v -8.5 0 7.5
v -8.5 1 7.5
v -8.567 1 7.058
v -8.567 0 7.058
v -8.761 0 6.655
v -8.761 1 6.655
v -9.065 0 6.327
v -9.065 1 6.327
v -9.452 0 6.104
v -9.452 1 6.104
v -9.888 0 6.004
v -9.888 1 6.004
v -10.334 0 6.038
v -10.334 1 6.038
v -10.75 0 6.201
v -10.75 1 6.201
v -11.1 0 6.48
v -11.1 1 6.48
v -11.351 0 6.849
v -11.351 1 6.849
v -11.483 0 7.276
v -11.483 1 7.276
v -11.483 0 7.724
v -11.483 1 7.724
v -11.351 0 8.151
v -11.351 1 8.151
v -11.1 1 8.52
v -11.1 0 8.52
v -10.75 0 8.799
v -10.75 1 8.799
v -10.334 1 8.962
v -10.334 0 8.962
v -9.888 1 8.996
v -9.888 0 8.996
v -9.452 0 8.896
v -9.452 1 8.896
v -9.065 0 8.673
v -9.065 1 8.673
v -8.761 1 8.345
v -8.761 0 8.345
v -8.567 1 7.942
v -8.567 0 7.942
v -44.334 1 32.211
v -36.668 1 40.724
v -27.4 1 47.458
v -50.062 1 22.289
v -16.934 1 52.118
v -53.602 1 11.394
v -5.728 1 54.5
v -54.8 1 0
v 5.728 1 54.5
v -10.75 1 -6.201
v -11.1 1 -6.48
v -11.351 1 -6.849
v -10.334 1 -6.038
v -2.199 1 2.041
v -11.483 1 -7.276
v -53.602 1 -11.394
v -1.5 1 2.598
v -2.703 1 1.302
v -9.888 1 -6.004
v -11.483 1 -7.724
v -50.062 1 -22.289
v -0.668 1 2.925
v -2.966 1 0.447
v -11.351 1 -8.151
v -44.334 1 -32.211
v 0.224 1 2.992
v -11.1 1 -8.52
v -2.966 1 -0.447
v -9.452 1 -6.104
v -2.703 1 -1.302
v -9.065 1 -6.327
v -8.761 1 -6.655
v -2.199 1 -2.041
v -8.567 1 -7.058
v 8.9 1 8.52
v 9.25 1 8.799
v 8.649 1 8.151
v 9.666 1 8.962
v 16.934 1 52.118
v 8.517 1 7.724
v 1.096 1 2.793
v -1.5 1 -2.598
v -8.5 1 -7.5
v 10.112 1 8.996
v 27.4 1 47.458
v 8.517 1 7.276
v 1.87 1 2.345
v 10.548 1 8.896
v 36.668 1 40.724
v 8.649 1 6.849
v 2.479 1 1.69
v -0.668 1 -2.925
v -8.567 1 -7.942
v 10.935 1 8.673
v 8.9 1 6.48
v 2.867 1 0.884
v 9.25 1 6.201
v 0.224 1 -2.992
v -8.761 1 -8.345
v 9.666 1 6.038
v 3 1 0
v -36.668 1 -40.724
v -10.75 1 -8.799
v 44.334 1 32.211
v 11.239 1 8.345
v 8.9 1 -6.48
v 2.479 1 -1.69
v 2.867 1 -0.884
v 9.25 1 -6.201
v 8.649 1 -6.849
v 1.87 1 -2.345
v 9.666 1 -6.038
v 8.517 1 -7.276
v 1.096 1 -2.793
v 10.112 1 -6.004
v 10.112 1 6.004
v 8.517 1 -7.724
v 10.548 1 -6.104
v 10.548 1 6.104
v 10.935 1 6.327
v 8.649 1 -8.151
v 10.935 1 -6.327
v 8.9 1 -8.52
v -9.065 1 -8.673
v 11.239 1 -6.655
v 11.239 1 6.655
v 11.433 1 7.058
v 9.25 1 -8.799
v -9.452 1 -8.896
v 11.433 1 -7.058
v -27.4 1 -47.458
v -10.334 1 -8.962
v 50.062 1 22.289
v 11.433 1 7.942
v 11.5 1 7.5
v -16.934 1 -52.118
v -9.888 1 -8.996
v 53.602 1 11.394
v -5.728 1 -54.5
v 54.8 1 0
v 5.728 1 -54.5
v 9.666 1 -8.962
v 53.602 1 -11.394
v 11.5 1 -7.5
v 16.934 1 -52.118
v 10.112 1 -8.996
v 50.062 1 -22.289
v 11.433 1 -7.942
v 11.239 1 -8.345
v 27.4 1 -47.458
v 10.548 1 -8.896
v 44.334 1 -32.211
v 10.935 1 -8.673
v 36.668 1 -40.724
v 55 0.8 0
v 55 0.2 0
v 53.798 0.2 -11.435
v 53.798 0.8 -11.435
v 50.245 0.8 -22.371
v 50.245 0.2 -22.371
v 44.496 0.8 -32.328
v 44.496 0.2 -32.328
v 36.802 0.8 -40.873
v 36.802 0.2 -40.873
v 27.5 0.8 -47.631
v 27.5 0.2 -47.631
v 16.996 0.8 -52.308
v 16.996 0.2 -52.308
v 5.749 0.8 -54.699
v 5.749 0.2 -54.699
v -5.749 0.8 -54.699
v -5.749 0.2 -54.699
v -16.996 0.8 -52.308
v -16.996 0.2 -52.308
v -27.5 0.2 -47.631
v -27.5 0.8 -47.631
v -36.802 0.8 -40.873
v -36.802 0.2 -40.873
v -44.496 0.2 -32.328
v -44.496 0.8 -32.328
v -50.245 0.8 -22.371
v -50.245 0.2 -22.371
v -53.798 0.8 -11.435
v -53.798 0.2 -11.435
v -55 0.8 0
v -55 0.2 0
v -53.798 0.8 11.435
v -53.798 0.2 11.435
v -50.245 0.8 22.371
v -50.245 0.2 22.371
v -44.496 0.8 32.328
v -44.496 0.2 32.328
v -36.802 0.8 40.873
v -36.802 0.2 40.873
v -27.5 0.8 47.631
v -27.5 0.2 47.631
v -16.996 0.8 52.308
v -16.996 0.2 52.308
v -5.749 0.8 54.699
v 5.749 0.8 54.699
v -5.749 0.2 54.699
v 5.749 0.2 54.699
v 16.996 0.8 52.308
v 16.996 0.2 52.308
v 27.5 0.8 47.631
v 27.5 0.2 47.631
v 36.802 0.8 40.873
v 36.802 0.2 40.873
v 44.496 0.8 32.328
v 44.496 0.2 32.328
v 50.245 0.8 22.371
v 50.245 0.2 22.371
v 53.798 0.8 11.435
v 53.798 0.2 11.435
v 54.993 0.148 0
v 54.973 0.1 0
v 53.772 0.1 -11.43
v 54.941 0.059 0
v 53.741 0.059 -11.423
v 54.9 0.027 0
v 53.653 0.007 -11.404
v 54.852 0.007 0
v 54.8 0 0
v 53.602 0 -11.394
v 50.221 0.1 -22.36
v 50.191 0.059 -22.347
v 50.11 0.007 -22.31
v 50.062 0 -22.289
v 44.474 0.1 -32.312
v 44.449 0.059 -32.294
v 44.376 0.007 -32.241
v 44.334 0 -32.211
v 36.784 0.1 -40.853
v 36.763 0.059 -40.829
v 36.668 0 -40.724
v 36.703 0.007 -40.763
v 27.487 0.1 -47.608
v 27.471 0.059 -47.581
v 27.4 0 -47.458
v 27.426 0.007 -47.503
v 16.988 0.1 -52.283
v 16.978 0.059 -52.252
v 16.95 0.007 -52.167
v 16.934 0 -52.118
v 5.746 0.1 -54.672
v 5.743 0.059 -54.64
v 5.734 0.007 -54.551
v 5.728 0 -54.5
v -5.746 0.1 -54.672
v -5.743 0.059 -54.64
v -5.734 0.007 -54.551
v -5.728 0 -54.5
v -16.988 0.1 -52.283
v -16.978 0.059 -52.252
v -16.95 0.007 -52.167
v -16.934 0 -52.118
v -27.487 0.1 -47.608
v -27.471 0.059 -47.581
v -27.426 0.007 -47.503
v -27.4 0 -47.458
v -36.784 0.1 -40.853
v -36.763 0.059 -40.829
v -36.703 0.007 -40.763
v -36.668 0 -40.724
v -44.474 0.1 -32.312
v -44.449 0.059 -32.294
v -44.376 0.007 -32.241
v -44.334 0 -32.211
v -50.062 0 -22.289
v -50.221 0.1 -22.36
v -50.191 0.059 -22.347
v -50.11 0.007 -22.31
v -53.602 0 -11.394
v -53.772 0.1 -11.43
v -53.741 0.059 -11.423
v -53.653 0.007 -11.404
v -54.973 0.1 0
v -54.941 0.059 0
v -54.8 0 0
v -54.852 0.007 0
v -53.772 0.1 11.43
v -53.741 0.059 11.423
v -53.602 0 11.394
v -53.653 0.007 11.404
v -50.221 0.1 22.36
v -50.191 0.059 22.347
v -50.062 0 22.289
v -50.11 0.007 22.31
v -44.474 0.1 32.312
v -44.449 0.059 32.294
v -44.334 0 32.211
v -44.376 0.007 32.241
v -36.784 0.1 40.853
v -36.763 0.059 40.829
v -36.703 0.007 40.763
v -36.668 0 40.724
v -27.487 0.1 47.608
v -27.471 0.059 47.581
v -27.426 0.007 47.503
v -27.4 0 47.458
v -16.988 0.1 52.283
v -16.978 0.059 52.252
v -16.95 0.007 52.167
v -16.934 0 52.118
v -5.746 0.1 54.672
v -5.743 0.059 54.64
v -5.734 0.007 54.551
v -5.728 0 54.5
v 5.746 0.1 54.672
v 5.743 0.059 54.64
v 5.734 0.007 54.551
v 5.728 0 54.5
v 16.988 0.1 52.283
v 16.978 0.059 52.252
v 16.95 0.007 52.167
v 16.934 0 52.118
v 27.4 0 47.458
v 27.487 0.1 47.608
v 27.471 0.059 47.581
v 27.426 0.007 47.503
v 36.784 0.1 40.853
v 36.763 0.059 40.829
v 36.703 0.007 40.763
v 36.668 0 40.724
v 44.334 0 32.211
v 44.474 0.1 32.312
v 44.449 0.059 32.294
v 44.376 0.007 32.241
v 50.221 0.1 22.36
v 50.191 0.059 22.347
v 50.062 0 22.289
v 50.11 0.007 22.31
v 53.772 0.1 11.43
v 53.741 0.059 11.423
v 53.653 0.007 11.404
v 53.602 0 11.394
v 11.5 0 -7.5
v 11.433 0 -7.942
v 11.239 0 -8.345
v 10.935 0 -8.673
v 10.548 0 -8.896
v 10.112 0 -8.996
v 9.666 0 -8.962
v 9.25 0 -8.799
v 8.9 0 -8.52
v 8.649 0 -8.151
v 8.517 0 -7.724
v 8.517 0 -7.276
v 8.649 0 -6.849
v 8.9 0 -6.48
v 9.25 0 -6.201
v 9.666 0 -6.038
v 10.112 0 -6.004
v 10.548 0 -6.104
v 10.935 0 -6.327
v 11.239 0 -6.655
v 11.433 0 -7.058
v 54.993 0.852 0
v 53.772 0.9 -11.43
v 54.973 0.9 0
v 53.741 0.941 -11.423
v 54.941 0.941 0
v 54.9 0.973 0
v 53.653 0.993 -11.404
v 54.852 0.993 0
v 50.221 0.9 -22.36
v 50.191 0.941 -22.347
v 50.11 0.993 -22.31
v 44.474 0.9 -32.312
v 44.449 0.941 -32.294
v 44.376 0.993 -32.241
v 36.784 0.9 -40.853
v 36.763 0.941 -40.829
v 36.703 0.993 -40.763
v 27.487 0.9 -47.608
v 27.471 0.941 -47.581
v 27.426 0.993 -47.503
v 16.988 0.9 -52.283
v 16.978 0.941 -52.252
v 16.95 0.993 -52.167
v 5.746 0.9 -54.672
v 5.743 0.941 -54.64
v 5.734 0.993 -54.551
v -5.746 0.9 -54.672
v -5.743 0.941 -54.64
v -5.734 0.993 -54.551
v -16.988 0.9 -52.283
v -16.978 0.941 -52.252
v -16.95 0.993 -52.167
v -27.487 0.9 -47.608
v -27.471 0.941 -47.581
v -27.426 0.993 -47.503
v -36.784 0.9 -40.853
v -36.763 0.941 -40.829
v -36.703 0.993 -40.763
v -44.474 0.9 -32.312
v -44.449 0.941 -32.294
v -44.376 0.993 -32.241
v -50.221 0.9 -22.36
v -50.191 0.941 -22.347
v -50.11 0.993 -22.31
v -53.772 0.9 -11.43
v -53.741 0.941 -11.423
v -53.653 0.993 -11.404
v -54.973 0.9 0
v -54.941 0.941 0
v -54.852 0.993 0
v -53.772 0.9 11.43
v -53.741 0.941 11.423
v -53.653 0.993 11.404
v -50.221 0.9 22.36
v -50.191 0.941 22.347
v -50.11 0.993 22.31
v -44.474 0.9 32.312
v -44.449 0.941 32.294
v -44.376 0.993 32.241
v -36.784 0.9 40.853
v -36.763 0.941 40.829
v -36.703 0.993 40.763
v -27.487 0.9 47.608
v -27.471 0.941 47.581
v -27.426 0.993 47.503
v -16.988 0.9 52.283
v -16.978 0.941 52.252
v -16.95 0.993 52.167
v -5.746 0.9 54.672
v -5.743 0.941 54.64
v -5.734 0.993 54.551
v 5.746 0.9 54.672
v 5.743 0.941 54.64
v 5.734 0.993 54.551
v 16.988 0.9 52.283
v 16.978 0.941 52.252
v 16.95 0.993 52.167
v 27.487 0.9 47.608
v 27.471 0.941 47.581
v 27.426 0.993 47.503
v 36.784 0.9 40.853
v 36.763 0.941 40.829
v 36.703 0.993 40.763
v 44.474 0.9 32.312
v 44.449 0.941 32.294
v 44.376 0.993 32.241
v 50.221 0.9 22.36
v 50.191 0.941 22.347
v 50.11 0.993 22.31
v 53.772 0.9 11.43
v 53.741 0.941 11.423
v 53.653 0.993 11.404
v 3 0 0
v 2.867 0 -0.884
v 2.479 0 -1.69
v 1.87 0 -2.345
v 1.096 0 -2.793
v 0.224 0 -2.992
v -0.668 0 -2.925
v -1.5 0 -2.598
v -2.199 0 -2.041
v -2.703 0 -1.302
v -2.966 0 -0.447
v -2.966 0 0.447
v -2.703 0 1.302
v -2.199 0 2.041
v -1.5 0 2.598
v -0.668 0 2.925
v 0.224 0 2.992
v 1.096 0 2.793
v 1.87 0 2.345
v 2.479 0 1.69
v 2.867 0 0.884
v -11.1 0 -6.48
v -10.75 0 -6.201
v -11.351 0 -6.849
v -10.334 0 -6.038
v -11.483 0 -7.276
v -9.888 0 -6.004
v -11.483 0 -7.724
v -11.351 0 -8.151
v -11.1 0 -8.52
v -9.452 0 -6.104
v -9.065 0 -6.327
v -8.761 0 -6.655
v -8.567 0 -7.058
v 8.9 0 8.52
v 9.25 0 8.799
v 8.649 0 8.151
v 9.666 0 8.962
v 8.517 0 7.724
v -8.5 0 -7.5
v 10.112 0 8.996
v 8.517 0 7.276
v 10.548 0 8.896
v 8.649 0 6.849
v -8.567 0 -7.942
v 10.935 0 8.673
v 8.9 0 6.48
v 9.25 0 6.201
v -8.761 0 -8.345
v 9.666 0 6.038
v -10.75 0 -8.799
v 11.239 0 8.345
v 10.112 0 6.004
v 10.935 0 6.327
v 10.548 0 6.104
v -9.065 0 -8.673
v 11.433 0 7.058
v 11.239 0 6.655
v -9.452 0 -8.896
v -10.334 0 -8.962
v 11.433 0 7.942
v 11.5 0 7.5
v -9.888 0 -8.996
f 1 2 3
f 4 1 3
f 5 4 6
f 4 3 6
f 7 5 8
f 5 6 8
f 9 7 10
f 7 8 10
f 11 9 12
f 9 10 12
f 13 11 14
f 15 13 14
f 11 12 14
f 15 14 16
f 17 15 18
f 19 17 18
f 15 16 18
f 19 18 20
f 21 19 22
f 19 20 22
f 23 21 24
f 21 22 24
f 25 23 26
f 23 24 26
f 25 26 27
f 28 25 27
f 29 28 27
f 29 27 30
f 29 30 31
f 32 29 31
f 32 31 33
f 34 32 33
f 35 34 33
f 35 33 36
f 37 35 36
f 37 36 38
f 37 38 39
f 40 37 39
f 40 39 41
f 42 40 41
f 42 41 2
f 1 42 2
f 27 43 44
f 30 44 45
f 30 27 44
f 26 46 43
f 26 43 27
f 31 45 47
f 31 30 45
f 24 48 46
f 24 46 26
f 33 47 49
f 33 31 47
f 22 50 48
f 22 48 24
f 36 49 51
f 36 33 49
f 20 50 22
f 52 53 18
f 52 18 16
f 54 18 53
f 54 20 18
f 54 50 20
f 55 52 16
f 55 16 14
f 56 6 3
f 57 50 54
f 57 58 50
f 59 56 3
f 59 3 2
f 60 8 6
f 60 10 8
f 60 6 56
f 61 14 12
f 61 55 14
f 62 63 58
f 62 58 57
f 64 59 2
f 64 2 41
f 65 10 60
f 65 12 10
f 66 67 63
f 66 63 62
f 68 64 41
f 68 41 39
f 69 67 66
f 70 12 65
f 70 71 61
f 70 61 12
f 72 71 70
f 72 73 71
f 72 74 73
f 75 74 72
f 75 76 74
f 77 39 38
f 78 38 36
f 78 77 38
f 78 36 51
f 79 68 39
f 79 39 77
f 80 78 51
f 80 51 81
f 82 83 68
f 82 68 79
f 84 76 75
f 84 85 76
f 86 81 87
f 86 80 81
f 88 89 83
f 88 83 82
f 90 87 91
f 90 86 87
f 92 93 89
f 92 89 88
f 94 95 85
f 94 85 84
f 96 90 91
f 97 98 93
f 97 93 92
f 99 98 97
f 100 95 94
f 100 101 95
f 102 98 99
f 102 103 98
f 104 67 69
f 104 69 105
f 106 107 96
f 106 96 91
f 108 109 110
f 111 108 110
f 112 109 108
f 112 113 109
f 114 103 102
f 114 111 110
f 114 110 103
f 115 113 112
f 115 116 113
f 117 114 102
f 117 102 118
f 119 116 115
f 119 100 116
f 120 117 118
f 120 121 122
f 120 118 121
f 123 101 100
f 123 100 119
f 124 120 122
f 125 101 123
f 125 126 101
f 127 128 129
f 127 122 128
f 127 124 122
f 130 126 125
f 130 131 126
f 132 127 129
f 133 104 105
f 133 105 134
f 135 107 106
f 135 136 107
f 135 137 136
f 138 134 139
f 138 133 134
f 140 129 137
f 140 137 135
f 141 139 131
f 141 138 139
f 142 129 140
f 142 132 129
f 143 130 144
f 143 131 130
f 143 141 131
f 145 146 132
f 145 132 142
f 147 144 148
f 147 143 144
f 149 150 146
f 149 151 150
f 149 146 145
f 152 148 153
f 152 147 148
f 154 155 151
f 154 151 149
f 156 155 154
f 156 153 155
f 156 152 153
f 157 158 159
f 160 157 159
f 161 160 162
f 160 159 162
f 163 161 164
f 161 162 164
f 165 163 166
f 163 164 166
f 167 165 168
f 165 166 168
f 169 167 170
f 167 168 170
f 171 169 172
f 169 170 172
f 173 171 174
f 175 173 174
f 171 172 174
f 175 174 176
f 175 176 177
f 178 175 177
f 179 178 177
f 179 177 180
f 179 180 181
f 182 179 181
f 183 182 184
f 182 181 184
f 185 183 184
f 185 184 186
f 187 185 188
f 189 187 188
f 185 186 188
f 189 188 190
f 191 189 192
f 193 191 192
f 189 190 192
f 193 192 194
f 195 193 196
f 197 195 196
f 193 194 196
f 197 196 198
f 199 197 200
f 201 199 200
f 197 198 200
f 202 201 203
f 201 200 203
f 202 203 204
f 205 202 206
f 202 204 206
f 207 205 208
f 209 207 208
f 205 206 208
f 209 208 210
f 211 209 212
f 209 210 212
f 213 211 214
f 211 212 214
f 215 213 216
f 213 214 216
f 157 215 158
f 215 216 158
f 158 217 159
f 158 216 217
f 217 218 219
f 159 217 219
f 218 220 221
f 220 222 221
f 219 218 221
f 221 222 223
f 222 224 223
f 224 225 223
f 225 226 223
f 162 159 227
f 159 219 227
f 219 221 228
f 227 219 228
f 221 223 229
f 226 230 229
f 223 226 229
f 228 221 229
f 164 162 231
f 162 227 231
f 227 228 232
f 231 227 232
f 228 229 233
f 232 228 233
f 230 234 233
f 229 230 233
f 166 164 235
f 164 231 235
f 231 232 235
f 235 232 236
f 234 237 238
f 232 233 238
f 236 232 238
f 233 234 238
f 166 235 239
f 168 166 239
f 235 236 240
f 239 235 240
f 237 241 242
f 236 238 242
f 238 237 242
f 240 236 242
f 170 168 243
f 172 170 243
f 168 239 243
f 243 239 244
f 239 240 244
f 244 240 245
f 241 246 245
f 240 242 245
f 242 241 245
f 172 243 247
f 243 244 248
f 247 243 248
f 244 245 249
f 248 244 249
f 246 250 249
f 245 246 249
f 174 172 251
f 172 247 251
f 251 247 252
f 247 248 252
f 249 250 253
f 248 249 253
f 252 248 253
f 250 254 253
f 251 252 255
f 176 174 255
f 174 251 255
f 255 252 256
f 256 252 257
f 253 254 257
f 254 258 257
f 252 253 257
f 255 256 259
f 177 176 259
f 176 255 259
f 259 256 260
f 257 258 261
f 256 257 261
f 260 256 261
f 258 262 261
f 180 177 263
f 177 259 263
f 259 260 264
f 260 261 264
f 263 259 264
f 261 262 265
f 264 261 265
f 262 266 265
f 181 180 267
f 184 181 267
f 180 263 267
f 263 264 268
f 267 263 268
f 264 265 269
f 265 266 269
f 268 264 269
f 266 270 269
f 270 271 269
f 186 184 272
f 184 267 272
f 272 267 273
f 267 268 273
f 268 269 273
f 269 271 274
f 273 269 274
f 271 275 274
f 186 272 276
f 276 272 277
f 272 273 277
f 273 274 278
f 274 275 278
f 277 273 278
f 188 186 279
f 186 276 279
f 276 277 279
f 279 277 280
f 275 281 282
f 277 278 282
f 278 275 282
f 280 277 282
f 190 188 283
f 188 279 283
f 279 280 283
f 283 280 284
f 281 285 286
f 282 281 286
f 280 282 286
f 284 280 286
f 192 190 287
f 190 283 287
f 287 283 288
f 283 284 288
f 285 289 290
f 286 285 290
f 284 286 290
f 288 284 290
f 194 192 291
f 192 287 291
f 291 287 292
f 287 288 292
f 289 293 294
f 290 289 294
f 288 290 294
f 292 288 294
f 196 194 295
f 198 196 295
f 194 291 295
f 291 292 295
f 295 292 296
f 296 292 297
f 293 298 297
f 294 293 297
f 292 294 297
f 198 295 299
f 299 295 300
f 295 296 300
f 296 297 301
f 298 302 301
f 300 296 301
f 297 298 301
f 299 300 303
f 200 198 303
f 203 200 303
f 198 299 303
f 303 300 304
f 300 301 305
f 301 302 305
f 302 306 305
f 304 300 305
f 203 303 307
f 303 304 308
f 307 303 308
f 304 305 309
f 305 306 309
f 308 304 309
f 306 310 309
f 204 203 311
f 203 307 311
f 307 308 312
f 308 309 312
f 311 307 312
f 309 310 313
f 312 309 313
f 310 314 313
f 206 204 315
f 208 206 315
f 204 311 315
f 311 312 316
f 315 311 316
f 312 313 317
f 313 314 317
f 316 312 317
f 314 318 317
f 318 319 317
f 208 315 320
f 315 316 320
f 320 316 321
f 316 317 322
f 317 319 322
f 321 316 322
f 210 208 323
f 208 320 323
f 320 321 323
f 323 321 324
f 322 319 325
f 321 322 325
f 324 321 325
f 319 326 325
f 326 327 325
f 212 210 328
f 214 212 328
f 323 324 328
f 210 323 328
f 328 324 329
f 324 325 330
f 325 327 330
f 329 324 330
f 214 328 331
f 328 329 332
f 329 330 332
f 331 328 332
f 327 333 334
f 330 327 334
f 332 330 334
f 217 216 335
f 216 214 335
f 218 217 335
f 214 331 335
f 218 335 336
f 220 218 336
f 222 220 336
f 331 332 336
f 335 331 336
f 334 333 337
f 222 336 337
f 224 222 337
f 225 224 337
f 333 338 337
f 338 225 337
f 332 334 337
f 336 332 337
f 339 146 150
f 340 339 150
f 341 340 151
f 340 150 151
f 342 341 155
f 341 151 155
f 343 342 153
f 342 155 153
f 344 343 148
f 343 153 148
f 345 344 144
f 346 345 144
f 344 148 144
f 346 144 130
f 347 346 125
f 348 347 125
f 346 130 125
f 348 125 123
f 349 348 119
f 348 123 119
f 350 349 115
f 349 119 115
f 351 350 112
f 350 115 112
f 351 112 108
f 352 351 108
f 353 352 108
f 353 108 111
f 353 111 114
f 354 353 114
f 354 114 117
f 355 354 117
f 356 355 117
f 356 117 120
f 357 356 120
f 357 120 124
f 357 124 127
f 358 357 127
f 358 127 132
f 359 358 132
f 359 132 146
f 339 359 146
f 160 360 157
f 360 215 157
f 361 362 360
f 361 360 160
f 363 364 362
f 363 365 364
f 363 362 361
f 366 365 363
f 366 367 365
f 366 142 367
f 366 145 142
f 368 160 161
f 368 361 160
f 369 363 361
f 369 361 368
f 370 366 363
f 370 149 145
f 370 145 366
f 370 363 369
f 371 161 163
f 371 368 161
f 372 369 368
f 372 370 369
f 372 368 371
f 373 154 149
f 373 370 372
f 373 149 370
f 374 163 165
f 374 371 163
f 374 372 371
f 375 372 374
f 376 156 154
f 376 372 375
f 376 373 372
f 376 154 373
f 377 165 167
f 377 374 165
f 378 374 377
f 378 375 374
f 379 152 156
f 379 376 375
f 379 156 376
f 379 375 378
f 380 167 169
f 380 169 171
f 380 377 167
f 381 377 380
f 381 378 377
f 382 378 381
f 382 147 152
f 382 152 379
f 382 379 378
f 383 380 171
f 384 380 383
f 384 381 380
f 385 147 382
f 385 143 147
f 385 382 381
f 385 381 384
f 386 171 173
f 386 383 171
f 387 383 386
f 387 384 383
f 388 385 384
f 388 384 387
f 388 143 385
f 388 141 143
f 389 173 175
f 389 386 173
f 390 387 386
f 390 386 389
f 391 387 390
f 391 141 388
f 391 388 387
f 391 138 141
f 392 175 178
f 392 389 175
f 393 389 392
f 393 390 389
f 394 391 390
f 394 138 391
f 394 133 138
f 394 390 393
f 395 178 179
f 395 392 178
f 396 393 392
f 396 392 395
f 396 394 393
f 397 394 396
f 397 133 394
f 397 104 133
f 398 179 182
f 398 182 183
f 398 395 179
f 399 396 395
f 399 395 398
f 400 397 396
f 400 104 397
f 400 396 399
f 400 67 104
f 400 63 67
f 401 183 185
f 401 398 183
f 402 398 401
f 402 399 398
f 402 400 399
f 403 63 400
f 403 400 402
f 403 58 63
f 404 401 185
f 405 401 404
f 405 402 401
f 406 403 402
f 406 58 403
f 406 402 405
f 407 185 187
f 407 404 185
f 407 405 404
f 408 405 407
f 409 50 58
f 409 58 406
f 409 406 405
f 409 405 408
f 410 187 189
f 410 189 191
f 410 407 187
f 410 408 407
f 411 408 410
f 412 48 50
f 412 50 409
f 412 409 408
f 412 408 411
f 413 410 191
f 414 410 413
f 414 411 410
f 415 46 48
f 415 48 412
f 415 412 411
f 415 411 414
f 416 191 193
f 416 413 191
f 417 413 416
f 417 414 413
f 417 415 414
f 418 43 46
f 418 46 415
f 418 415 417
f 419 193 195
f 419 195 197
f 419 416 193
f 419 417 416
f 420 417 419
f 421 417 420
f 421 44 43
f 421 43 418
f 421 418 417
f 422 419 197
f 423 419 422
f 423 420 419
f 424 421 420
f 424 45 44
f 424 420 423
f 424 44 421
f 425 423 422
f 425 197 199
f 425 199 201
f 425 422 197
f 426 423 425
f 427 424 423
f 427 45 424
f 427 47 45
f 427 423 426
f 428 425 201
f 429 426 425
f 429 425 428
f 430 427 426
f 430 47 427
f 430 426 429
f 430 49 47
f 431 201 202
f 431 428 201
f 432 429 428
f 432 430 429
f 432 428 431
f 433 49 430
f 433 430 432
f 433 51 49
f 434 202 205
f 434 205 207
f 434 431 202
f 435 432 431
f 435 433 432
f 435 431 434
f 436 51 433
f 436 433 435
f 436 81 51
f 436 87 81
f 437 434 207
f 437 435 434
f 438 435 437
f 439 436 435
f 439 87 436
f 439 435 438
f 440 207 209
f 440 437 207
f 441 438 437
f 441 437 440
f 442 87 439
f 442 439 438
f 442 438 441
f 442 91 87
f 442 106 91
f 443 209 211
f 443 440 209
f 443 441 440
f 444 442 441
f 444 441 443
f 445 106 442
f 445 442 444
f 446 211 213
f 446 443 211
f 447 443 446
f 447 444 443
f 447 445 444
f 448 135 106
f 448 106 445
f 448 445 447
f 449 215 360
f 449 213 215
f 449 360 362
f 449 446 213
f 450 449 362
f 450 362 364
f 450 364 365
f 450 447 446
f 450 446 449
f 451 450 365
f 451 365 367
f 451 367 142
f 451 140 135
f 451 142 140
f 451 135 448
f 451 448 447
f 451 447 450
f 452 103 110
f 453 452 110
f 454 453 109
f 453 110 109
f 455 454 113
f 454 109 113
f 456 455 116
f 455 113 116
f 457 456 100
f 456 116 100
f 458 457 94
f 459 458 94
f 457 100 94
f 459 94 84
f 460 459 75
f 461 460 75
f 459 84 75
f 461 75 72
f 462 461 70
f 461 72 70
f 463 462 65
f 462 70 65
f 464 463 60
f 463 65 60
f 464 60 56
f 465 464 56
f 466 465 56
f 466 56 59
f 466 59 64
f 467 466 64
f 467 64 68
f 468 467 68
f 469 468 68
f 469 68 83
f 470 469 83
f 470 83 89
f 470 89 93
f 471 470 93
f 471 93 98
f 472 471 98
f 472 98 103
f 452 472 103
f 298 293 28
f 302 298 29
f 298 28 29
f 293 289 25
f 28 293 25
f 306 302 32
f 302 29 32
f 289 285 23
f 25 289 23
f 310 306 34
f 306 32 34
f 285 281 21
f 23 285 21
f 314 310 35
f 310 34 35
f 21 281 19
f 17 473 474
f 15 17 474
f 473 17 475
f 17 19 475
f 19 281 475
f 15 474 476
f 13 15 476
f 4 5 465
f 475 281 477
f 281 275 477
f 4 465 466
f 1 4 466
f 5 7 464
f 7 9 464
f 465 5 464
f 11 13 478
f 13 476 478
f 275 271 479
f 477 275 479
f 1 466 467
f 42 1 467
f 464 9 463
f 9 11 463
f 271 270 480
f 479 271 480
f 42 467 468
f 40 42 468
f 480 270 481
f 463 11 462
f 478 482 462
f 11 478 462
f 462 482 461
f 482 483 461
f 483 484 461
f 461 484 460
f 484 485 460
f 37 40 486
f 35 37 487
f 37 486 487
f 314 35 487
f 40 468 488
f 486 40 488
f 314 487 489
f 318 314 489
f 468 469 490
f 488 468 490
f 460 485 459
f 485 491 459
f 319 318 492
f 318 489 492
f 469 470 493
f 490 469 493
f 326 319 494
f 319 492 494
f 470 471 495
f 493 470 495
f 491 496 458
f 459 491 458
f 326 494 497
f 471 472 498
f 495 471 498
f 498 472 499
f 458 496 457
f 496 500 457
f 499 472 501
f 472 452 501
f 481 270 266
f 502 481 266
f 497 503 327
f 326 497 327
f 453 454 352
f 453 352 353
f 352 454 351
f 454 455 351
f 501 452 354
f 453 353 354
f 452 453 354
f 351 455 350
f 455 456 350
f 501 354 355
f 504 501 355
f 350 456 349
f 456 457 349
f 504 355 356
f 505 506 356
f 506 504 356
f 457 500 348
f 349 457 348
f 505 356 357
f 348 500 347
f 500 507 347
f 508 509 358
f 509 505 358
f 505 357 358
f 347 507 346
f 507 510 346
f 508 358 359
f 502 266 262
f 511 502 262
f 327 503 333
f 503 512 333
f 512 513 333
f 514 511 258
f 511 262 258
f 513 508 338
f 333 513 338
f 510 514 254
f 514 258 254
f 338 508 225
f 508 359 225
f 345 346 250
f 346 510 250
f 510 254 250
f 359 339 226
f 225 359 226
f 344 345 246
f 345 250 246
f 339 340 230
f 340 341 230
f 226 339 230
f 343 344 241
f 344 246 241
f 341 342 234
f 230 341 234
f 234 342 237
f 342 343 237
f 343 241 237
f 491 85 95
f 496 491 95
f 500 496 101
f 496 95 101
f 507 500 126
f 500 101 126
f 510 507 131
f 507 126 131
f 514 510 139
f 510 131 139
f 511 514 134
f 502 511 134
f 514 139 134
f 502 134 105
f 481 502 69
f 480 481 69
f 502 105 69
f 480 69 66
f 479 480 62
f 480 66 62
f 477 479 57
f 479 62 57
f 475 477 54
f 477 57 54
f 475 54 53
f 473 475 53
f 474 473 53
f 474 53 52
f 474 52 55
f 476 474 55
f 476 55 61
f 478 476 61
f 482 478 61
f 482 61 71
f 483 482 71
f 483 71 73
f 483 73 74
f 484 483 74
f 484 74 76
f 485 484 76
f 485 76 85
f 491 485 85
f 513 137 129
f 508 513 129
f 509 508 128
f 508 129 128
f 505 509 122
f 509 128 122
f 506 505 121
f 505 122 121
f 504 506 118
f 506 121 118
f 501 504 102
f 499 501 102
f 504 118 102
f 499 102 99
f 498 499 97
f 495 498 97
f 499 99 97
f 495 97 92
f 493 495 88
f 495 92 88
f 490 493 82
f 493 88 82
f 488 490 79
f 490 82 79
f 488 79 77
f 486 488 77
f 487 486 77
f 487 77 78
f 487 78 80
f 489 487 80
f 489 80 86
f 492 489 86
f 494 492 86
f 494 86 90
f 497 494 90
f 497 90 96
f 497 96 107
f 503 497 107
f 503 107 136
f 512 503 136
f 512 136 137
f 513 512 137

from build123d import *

# Parameters (mm, degrees)
SKETCH1_R           = 55
BOSS_EXTRUDE1_DEPTH = 1
FILLET2_R           = 0.2
SKETCH4_R           = 3
CUT_EXTRUDE2_DEPTH  = 2
SKETCH3_R           = 1.5
CUT_EXTRUDE3_DEPTH  = 2


with BuildPart() as part:
    # Sketch1 → Boss-Extrude1 (new body)
    with BuildSketch(Plane(origin=(0, 0, 0), x_dir=(1, 0, 0), z_dir=(0, 1, 0))):
        Circle(SKETCH1_R)
    extrude(amount=BOSS_EXTRUDE1_DEPTH)

    # Fillet2
    fillet2_edges = [part.edges().sort_by_distance(p)[0] for p in [
        (-55, 0, 0),
        (-55, 1, 0),
    ]]
    fillet(fillet2_edges, radius=FILLET2_R)

    # Sketch4 → Cut-Extrude2 (cut, through all)
    with BuildSketch(Plane(origin=(0, 1, 0), x_dir=(1, 0, 0), z_dir=(0, 1, 0))):
        Circle(SKETCH4_R)
    extrude(amount=-CUT_EXTRUDE2_DEPTH, mode=Mode.SUBTRACT)

    # Sketch3 → Cut-Extrude3 (cut, through all)
    with BuildSketch(Plane(origin=(0, 1, 0), x_dir=(1, 0, 0), z_dir=(0, 1, 0))):
        with Locations((-10, 7.5)):
            Circle(SKETCH3_R)
        with Locations((10, 7.5)):
            Circle(SKETCH3_R)
        with Locations((10, -7.5)):
            Circle(SKETCH3_R)
        with Locations((-10, -7.5)):
            Circle(SKETCH3_R)
    extrude(amount=-CUT_EXTRUDE3_DEPTH, mode=Mode.SUBTRACT)


solid = part.part
